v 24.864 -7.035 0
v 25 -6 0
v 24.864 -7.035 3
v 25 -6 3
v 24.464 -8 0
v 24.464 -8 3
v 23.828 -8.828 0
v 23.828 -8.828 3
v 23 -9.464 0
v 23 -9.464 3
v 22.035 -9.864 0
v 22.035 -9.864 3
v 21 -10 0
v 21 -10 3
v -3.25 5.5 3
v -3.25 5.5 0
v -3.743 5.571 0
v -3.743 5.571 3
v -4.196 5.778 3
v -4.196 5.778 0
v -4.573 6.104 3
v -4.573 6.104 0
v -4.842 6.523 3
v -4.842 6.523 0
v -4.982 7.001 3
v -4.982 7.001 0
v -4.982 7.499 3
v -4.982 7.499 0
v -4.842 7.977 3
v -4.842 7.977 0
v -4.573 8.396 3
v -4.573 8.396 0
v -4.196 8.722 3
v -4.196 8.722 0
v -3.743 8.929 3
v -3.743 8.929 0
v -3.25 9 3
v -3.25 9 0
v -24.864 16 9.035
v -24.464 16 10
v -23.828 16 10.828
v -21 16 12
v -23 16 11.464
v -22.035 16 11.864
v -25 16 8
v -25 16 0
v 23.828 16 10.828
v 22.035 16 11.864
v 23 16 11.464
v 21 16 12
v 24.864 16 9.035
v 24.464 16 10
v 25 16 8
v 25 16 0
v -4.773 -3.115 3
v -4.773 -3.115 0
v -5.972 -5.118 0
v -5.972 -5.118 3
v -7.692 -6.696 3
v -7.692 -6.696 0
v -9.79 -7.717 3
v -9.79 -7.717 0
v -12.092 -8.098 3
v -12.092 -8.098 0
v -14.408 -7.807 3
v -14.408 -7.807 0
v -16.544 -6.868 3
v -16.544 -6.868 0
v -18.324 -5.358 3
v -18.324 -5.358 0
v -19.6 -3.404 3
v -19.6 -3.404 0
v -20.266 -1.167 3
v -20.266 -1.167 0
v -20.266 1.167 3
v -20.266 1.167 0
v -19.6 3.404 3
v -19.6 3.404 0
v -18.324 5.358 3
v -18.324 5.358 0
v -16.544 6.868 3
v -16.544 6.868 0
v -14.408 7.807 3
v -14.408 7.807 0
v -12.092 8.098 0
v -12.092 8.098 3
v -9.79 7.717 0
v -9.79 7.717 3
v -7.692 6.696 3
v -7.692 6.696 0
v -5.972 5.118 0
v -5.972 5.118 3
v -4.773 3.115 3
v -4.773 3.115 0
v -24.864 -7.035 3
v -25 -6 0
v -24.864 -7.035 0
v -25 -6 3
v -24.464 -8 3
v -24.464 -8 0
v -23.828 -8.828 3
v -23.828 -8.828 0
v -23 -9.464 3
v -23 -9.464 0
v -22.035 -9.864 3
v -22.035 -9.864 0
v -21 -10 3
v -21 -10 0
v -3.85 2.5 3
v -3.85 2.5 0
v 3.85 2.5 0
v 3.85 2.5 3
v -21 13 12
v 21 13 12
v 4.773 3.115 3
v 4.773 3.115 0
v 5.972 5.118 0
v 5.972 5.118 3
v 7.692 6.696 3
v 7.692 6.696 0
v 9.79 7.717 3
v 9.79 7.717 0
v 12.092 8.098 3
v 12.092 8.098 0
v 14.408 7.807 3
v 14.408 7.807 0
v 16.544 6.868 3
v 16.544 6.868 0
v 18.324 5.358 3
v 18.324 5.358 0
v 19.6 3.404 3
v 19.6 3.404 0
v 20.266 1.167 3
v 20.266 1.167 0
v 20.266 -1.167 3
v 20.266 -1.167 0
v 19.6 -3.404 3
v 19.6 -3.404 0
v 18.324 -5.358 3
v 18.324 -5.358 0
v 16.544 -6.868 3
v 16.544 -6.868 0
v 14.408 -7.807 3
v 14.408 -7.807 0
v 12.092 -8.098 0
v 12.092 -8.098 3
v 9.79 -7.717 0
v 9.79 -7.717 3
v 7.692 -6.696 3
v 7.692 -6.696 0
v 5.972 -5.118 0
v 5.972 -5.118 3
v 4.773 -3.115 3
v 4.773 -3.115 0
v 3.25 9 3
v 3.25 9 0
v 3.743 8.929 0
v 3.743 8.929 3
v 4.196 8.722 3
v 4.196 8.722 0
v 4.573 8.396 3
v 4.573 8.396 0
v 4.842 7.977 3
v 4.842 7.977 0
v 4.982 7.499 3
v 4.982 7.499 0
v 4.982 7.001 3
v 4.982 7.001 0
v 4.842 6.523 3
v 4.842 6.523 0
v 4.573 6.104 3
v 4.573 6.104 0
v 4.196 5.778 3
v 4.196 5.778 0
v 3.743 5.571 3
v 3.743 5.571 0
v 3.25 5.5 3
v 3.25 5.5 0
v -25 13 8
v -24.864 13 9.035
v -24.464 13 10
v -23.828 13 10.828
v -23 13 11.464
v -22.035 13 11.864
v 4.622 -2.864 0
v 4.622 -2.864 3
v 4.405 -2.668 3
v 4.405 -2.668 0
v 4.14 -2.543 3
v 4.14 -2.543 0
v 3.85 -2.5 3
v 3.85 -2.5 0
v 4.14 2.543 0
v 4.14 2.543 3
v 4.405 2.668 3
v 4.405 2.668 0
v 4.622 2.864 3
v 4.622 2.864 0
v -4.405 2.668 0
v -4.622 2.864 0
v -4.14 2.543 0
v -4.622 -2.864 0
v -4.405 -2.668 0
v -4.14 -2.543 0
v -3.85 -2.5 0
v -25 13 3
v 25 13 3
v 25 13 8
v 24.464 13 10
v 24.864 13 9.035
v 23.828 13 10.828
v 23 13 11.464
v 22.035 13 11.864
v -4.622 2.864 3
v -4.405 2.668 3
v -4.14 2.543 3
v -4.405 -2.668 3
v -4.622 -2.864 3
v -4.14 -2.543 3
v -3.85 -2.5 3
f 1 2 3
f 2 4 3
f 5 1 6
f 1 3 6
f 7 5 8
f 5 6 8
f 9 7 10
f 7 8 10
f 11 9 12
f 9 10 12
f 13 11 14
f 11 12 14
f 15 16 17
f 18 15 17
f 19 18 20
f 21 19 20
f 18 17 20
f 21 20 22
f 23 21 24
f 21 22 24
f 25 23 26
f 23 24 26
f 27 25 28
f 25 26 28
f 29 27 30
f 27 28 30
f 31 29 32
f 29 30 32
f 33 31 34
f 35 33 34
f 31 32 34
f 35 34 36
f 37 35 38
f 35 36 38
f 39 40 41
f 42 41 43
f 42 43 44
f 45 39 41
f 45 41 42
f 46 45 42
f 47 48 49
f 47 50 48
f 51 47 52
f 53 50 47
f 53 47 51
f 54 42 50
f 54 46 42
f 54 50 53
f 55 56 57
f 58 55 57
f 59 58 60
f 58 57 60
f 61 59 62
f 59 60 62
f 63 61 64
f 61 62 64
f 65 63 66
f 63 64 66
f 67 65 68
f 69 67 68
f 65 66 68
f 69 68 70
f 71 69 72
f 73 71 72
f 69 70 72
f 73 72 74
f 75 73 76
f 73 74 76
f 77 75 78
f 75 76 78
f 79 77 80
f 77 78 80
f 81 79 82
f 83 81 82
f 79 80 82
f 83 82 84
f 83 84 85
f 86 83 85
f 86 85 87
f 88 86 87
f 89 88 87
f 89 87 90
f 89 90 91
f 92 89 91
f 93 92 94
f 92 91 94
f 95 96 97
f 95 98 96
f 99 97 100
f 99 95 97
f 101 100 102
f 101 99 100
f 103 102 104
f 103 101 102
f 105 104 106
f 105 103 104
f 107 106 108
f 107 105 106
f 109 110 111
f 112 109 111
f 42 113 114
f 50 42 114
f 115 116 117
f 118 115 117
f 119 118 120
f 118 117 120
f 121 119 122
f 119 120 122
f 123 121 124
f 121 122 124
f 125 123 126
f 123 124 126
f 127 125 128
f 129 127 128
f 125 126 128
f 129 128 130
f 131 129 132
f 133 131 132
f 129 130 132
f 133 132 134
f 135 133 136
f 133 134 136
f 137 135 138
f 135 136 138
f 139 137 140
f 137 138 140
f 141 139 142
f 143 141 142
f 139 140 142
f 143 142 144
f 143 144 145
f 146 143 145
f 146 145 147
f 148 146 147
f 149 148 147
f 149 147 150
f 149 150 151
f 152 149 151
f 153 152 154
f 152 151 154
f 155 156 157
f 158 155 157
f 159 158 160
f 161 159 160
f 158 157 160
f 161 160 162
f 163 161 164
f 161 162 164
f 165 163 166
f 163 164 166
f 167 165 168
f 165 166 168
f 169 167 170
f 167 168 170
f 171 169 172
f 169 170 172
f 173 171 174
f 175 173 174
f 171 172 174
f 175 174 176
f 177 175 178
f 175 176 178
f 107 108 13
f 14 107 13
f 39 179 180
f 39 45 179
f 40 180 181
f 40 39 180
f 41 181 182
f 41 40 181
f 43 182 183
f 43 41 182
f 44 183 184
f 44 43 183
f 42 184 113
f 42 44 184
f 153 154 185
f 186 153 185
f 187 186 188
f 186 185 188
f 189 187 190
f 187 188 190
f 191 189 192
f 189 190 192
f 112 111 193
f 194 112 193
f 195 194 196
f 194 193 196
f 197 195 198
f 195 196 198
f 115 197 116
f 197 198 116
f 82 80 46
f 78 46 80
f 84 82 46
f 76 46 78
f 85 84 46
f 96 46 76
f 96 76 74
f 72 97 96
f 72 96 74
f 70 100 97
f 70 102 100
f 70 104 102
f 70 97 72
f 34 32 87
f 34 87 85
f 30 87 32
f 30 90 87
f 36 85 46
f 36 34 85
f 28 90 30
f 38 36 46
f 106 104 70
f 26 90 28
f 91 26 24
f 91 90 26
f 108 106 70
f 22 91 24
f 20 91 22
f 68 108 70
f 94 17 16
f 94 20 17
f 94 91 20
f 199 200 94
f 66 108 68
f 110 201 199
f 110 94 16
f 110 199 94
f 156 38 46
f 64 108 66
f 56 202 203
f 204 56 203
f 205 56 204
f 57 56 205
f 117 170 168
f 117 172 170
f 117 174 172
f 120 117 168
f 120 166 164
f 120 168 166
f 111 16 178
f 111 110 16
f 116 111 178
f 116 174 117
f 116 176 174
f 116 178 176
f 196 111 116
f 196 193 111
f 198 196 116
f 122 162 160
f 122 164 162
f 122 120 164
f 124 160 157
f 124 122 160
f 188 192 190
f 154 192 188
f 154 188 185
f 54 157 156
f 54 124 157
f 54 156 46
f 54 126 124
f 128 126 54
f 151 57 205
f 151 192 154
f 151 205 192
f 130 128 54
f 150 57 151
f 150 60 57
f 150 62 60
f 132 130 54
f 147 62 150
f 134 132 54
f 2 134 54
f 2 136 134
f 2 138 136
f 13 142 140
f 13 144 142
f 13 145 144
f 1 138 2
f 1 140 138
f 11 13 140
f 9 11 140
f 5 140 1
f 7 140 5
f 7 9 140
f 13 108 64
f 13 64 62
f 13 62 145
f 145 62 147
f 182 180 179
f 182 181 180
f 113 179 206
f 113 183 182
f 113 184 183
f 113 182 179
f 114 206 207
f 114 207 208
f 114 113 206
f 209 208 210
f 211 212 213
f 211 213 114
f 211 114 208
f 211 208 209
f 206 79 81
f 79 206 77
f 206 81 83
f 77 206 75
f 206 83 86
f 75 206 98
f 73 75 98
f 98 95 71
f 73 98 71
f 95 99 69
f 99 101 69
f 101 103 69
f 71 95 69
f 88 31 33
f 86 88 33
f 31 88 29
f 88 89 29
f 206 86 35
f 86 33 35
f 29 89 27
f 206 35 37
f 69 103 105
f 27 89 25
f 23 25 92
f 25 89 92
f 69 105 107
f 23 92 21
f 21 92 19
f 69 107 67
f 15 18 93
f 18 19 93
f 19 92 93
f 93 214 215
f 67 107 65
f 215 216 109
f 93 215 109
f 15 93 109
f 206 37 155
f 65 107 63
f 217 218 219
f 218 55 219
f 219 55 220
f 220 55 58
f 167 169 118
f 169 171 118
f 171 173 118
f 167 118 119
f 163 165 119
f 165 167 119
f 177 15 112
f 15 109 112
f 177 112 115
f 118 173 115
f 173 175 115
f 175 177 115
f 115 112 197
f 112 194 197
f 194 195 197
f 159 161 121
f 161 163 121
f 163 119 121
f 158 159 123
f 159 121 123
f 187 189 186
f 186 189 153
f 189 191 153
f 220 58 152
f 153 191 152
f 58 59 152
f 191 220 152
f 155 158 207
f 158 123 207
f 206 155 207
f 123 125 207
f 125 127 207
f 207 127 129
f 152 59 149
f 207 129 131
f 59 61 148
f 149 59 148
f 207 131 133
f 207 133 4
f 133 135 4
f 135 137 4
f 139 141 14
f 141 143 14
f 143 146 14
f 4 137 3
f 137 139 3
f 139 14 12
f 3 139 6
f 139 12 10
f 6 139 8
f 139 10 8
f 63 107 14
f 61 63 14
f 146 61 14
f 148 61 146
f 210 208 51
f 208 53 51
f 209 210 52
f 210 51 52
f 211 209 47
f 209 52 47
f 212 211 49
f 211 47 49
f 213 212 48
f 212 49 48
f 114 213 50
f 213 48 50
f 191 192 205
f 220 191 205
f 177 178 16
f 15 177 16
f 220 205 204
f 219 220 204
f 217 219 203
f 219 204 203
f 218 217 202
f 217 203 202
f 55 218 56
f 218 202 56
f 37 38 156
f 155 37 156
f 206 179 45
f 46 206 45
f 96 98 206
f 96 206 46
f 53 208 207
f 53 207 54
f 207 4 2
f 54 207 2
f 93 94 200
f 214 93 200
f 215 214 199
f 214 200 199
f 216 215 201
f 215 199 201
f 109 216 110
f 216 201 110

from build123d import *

# Parameters (mm, degrees)
SKETCH_1_W          = 50
SKETCH_1_H          = 20
EXTRUDE_1_DEPTH     = 3
SKETCH_2_W          = 50
SKETCH_2_H          = 12
EXTRUDE_2_DEPTH     = 6
SKETCH_5_W          = 50
SKETCH_5_H          = 9
CUT_EXTRUDE_2_DEPTH = 3
FILLET_1_R          = 4


with BuildPart() as part:
    # 草图1 → 凸台-拉伸1 (new body)
    with BuildSketch(Plane.XY):
        Rectangle(SKETCH_1_W, SKETCH_1_H)
        with BuildLine():
            Line((-3.85, 2.5), (3.85, 2.5))
            ThreePointArc((3.85, 2.5), (4.404700196, 2.667949706), (4.773076923, 3.115384615))
            ThreePointArc((4.773076923, 3.115384615), (20.35, 0), (4.773076923, -3.115384615))
            ThreePointArc((4.773076923, -3.115384615), (4.404700196, -2.667949706), (3.85, -2.5))
            Line((3.85, -2.5), (-3.85, -2.5))
            ThreePointArc((-3.85, -2.5), (-4.404700196, -2.667949706), (-4.773076923, -3.115384615))
            ThreePointArc((-4.773076923, -3.115384615), (-20.35, 0), (-4.773076923, 3.115384615))
            ThreePointArc((-4.773076923, 3.115384615), (-4.404700196, 2.667949706), (-3.85, 2.5))
        make_face(mode=Mode.SUBTRACT)
        with BuildLine():
            Line((3.25, 5.5), (-3.25, 5.5))
            ThreePointArc((-3.25, 5.5), (-5, 7.25), (-3.25, 9))
            Line((-3.25, 9), (3.25, 9))
            ThreePointArc((3.25, 9), (5, 7.25), (3.25, 5.5))
        make_face(mode=Mode.SUBTRACT)
    extrude(amount=EXTRUDE_1_DEPTH)

    # 草图2 → 凸台-拉伸2 (add)
    with BuildSketch(Plane(origin=(0, 10, 0), x_dir=(1, 0, 0), z_dir=(0, 1, 0))):
        with Locations((0, -6)):
            Rectangle(SKETCH_2_W, SKETCH_2_H)
    extrude(amount=EXTRUDE_2_DEPTH)

    # 草图5 → 切除-拉伸2 (cut)
    with BuildSketch(Plane.XZ.offset(-10)):
        with Locations((0, 7.5)):
            Rectangle(SKETCH_5_W, SKETCH_5_H)
    extrude(amount=-CUT_EXTRUDE_2_DEPTH, mode=Mode.SUBTRACT)

    # 圆角1
    fillet_1_edges = [part.edges().sort_by_distance(p)[0] for p in [
        (-25, 14.5, 12),
        (25, 14.5, 12),
        (25, -10, 1.5),
        (-25, -10, 1.5),
    ]]
    fillet(fillet_1_edges, radius=FILLET_1_R)


solid = part.part
